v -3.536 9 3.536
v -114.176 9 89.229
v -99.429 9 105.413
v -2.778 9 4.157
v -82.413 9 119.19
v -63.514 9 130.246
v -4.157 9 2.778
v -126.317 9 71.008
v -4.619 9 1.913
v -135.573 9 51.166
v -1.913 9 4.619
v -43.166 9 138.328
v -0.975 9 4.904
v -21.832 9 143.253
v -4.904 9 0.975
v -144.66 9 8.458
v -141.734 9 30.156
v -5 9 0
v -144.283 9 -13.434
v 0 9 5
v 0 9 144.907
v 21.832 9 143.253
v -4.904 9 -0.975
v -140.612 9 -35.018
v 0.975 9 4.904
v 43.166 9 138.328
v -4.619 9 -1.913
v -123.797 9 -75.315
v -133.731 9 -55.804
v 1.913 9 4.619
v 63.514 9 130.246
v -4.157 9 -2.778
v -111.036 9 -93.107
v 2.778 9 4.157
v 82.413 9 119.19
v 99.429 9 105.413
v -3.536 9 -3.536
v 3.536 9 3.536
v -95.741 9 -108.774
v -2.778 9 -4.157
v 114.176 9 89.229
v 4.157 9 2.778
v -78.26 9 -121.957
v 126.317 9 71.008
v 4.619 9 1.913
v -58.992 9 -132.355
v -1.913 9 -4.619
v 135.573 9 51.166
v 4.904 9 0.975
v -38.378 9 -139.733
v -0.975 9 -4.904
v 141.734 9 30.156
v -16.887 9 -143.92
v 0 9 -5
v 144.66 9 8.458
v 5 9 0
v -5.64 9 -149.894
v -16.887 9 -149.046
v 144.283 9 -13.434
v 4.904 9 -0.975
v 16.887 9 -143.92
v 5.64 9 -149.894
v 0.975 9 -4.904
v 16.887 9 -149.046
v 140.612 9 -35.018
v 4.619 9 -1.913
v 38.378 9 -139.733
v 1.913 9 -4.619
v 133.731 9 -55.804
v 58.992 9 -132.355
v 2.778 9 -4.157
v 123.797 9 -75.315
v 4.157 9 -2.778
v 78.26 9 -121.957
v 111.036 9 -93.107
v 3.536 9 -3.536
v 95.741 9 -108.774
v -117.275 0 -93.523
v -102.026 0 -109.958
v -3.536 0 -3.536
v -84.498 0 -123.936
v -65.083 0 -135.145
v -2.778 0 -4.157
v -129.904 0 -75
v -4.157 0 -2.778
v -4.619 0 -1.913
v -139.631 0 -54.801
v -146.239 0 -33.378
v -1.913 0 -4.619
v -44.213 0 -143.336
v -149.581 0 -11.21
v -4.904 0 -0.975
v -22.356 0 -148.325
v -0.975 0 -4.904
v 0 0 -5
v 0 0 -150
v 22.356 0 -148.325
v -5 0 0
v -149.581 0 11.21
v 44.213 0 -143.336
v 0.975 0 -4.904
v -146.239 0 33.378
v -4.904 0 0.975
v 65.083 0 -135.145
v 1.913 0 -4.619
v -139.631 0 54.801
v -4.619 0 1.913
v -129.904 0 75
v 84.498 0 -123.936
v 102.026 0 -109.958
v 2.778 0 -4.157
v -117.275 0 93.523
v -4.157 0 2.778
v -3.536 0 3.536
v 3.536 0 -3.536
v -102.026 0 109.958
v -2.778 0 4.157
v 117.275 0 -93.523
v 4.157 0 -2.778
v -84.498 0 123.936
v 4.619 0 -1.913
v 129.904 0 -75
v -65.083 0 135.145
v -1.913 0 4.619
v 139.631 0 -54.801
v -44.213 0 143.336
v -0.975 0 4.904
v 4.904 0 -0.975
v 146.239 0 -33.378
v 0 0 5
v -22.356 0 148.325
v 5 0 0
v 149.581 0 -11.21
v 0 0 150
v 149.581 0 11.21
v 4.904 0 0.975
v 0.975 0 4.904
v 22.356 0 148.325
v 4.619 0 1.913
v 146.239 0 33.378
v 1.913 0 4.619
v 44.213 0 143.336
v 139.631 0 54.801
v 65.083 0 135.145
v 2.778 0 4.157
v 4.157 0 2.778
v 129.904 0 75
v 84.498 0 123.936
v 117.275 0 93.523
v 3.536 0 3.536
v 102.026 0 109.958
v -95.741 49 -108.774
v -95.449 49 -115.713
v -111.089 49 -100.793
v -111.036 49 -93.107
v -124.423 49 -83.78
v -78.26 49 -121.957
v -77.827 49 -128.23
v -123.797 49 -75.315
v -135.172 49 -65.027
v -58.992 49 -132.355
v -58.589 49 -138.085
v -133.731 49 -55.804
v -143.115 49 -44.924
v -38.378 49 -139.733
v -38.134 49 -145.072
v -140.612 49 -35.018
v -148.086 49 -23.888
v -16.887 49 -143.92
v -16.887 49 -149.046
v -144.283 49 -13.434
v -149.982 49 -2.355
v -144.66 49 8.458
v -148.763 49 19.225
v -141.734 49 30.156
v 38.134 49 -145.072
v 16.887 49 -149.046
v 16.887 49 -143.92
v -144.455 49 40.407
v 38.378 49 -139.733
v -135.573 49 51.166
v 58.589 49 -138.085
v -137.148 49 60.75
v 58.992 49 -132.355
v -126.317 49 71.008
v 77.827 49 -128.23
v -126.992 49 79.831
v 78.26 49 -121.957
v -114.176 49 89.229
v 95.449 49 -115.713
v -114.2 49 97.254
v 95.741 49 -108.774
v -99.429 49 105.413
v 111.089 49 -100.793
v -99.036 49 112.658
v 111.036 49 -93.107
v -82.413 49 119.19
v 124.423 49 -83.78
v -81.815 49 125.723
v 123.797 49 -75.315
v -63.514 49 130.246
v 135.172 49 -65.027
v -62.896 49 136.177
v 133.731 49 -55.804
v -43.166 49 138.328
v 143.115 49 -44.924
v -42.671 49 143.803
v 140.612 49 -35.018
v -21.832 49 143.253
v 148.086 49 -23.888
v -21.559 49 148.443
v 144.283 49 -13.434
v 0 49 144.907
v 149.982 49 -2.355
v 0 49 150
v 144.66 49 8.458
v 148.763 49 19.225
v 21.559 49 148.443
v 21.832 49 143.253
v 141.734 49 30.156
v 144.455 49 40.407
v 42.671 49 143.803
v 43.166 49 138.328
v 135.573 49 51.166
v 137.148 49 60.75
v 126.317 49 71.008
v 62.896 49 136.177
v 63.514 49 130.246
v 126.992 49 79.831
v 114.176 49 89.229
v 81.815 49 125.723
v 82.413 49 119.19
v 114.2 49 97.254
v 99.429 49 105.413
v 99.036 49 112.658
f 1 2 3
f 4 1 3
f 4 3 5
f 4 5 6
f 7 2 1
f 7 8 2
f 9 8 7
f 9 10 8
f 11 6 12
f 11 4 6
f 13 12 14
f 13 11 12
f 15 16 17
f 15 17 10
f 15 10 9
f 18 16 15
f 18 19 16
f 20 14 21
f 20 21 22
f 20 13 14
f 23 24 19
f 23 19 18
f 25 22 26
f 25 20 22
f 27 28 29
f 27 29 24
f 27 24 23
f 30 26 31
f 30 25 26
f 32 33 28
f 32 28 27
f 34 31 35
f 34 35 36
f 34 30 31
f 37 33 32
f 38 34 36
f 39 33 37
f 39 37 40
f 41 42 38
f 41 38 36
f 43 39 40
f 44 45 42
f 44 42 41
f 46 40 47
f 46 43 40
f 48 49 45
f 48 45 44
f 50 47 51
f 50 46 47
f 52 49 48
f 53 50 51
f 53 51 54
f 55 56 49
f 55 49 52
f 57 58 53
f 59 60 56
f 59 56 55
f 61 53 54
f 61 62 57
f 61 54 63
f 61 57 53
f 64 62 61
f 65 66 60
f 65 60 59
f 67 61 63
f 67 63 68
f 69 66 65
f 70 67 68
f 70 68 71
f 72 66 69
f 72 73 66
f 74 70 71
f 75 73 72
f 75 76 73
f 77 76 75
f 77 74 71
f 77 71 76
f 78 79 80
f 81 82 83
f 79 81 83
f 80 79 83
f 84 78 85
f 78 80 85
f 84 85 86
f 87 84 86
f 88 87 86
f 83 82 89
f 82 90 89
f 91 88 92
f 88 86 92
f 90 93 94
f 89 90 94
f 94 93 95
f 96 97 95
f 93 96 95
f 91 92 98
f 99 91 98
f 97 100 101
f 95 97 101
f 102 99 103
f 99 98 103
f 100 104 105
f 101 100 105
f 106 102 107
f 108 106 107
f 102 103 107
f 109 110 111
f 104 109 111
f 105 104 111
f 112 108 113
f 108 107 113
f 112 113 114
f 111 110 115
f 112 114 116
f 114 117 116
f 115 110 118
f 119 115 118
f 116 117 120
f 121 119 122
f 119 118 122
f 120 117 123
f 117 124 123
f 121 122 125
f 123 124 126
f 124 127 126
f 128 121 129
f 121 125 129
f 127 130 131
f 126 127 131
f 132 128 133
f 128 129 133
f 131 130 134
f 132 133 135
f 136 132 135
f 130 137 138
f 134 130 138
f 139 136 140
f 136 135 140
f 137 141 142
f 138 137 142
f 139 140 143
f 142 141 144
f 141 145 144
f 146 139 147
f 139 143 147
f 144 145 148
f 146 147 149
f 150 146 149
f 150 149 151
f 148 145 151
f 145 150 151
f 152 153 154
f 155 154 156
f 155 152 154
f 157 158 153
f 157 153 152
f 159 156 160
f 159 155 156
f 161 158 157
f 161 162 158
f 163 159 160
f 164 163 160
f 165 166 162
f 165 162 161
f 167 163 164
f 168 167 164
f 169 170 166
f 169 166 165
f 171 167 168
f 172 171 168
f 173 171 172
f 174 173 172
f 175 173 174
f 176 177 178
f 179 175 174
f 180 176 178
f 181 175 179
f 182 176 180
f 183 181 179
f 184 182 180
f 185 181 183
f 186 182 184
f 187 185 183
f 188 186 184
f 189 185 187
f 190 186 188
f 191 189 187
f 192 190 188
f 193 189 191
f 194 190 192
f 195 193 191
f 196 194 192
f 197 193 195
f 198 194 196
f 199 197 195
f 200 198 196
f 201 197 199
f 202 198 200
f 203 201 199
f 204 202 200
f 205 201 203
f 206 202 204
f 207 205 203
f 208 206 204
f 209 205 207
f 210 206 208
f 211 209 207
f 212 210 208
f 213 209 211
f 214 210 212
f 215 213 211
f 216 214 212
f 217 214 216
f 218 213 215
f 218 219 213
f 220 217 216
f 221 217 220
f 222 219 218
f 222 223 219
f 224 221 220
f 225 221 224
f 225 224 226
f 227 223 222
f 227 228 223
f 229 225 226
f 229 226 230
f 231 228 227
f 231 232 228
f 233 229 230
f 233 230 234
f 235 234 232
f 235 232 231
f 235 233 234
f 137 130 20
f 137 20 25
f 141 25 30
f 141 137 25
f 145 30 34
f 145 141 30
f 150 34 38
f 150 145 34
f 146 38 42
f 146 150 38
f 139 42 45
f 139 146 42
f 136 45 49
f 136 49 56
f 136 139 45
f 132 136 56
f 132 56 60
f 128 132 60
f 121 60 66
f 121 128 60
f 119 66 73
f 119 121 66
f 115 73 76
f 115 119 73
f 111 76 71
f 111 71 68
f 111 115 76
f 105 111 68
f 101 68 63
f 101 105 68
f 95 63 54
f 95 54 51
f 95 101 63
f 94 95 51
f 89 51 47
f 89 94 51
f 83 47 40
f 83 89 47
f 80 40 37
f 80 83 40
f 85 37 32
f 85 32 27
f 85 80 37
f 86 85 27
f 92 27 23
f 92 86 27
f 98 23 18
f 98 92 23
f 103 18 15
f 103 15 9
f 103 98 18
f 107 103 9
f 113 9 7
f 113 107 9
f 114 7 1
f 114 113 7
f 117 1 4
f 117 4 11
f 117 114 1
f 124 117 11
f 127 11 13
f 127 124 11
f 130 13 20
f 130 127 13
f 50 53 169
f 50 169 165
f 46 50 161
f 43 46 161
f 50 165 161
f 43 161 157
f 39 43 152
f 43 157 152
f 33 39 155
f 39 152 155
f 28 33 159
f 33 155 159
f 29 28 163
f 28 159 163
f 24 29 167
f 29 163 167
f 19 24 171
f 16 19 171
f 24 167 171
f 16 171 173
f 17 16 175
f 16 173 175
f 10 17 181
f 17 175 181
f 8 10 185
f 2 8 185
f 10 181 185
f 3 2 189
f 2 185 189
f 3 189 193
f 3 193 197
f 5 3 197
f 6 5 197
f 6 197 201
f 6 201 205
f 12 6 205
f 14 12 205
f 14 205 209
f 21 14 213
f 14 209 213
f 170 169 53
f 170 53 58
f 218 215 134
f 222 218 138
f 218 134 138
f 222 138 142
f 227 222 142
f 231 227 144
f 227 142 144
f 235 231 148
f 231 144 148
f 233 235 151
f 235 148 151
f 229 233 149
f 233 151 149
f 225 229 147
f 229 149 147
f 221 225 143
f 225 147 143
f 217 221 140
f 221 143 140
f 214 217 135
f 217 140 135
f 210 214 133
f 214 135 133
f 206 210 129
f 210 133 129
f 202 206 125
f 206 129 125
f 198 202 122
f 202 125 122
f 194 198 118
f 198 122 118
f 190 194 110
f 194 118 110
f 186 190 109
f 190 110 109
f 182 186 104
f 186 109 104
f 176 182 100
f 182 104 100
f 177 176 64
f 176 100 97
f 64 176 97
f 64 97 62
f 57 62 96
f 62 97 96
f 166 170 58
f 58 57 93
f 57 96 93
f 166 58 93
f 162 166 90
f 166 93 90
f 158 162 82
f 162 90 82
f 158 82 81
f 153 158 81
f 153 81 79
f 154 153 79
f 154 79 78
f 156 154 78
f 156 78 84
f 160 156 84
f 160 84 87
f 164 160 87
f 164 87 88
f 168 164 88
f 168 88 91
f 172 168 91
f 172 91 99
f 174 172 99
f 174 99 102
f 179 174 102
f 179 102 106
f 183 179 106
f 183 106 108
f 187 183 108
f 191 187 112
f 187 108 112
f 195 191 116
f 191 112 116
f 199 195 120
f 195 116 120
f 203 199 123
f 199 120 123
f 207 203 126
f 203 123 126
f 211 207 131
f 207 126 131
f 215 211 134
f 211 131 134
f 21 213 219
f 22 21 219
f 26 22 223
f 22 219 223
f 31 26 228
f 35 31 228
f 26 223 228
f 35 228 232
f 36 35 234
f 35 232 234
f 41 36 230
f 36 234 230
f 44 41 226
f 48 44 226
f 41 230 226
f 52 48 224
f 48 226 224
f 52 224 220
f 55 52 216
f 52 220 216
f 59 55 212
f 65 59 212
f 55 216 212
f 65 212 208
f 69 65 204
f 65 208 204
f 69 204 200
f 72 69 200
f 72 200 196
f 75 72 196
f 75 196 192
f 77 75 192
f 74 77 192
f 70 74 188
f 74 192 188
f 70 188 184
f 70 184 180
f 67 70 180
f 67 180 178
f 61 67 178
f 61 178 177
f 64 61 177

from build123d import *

# Parameters (mm, degrees)
SKETCH2_R           = 150
SKETCH2_R_2         = 5
BOSS_EXTRUDE1_DEPTH = 9
SKETCH3_R           = 150
BOSS_EXTRUDE2_DEPTH = 40
SKETCH9_R           = 144.906998713
CUT_EXTRUDE2_DEPTH  = 40
SKETCH11_W          = 33.774160464
SKETCH11_H          = 12.160705968
CUT_EXTRUDE9_DEPTH  = 40


with BuildPart() as part:
    # Sketch2 → Boss-Extrude1 (new body)
    with BuildSketch(Plane(origin=(0, 0, 0), x_dir=(1, 0, 0), z_dir=(0, 1, 0))):
        with Locations(Location((0, 0, 0), (0, 0, 270))):
            Circle(SKETCH2_R)
        with Locations(Location((0, 0, 0), (0, 0, 270))):
            Circle(SKETCH2_R_2, mode=Mode.SUBTRACT)
    extrude(amount=BOSS_EXTRUDE1_DEPTH)

    # Sketch3 → Boss-Extrude2 (add)
    with BuildSketch(Plane(origin=(0, 9, 0), x_dir=(1, 0, 0), z_dir=(0, 1, 0))):
        with Locations(Location((0, 0, 0), (0, 0, 270))):
            Circle(SKETCH3_R)
    extrude(amount=BOSS_EXTRUDE2_DEPTH)

    # Sketch9 → Cut-Extrude2 (cut)
    with BuildSketch(Plane(origin=(0, 49, 0), x_dir=(1, 0, 0), z_dir=(0, 1, 0))):
        with Locations(Location((0, 0, 0), (0, 0, 270))):
            Circle(SKETCH9_R)
    extrude(amount=-CUT_EXTRUDE2_DEPTH, mode=Mode.SUBTRACT)

    # Sketch11 → Cut-Extrude9 (cut)
    with BuildSketch(Plane(origin=(0, 49, 0), x_dir=(1, 0, 0), z_dir=(0, 1, 0))):
        with Locations((0, 150)):
            Rectangle(SKETCH11_W, SKETCH11_H)
    extrude(amount=-CUT_EXTRUDE9_DEPTH, mode=Mode.SUBTRACT)


solid = part.part
